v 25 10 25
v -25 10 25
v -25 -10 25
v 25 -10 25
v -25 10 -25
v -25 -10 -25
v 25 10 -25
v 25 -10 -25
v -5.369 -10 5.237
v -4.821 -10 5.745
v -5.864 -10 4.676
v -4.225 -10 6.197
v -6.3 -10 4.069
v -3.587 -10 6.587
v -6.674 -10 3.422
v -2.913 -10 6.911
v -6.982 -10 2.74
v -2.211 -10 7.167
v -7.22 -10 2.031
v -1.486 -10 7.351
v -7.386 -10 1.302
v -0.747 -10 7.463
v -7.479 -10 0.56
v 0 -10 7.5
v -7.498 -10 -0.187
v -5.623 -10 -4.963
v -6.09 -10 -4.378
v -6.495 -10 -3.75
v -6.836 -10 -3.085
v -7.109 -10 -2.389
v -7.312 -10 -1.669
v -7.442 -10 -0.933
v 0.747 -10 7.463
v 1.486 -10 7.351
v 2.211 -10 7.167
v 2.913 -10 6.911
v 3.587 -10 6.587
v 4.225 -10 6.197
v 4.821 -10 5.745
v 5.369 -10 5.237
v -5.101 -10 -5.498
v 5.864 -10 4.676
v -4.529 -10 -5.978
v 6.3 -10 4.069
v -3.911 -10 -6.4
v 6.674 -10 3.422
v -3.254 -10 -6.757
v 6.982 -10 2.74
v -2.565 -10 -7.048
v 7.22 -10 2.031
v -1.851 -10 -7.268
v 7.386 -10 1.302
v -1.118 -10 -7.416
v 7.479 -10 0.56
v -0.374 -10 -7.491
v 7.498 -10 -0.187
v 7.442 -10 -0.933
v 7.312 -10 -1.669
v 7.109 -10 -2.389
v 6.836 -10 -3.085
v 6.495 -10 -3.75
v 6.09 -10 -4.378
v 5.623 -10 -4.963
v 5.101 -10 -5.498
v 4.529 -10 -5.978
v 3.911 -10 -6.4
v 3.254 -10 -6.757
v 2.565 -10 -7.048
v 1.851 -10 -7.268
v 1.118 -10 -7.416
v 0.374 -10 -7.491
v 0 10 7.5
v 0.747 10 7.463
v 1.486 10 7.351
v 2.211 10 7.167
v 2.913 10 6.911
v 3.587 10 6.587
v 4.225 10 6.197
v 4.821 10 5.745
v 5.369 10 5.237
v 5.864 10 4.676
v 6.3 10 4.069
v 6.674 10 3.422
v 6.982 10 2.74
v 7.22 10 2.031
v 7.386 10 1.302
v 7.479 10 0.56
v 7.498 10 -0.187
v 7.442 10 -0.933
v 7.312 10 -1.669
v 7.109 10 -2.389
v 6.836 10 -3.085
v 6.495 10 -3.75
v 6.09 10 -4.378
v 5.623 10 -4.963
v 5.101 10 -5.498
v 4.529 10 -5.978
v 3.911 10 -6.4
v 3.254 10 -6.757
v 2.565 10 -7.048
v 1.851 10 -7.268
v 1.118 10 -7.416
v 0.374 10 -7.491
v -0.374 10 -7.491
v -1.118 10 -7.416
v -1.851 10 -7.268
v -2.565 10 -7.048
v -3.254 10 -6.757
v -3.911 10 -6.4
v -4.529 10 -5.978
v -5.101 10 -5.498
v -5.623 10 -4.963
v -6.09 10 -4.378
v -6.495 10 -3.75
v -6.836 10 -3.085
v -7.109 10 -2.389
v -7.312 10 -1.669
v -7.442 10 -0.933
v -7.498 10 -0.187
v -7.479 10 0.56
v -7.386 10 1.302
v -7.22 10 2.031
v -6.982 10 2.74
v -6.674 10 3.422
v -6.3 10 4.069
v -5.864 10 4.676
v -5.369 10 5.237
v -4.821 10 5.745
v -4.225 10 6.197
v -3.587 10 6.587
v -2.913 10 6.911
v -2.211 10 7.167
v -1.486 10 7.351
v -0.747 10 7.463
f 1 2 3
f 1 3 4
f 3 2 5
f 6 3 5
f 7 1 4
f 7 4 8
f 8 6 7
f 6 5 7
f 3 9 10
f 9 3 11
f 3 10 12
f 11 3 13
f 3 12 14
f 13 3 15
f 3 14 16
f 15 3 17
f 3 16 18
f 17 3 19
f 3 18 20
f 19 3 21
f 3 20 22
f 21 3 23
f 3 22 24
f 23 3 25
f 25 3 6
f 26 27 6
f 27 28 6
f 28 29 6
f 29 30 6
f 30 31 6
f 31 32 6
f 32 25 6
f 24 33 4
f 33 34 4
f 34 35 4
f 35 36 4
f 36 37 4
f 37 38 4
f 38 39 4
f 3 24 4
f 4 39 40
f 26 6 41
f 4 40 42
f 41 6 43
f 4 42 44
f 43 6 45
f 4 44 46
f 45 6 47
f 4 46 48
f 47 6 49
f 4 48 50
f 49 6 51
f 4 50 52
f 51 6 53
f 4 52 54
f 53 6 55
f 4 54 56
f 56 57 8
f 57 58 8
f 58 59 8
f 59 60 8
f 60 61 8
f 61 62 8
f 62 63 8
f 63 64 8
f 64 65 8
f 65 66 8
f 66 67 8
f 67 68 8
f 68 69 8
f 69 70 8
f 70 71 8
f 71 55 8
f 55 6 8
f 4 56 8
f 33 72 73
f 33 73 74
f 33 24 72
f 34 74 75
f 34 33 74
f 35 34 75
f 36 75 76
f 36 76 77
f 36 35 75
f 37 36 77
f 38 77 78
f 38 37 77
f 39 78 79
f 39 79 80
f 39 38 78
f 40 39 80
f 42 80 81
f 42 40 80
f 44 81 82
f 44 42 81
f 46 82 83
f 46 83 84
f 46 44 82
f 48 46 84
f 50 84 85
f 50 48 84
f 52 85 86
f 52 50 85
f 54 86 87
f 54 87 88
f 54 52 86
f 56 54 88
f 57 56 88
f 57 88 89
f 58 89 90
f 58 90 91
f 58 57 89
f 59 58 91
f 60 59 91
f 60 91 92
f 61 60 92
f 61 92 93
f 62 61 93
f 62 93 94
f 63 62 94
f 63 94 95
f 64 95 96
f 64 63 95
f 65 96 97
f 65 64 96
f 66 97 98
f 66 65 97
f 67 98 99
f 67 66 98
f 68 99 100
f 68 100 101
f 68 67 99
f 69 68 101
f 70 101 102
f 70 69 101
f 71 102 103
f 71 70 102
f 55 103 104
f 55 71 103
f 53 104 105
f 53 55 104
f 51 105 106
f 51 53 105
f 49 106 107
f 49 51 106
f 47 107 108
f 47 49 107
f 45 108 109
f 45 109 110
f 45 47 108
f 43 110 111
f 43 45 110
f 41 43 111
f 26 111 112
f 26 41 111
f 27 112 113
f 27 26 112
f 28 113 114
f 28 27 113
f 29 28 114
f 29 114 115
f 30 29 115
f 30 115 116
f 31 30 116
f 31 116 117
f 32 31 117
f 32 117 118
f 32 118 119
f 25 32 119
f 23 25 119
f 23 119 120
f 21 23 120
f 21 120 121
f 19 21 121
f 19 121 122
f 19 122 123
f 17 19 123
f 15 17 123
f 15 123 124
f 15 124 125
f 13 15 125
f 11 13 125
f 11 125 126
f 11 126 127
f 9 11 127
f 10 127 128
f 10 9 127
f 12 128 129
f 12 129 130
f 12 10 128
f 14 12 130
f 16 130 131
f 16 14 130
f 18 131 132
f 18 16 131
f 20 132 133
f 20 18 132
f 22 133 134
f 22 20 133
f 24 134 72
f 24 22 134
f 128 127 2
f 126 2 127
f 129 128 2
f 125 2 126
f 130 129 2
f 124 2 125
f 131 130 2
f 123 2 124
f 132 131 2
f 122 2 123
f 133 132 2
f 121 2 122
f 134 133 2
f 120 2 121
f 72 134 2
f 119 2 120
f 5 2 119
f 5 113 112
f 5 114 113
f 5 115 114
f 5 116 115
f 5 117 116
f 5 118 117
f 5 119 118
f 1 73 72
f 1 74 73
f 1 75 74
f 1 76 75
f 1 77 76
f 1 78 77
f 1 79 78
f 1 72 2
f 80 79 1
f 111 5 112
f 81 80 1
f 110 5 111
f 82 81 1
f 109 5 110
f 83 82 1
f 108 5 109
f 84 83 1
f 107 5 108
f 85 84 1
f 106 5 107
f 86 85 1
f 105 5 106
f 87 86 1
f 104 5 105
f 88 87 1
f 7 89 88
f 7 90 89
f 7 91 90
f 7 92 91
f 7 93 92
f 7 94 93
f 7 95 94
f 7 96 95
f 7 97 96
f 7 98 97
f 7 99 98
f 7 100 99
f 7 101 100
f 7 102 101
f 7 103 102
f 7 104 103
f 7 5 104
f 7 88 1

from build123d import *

# Parameters (mm, degrees)
SKETCH1_W           = 50
SKETCH1_H           = 50
SKETCH1_R           = 7.5
BOSS_EXTRUDE1_DEPTH = 10


with BuildPart() as part:
    # Sketch1 → Boss-Extrude1 (new, symmetric)
    with BuildSketch(Plane(origin=(0, 0, 0), x_dir=(1, 0, 0), z_dir=(0, 1, 0))):
        Rectangle(SKETCH1_W, SKETCH1_H)
        with Locations(Location((0, 0, 0), (0, 0, 270))):
            Circle(SKETCH1_R, mode=Mode.SUBTRACT)
    extrude(amount=BOSS_EXTRUDE1_DEPTH, both=True)


solid = part.part
